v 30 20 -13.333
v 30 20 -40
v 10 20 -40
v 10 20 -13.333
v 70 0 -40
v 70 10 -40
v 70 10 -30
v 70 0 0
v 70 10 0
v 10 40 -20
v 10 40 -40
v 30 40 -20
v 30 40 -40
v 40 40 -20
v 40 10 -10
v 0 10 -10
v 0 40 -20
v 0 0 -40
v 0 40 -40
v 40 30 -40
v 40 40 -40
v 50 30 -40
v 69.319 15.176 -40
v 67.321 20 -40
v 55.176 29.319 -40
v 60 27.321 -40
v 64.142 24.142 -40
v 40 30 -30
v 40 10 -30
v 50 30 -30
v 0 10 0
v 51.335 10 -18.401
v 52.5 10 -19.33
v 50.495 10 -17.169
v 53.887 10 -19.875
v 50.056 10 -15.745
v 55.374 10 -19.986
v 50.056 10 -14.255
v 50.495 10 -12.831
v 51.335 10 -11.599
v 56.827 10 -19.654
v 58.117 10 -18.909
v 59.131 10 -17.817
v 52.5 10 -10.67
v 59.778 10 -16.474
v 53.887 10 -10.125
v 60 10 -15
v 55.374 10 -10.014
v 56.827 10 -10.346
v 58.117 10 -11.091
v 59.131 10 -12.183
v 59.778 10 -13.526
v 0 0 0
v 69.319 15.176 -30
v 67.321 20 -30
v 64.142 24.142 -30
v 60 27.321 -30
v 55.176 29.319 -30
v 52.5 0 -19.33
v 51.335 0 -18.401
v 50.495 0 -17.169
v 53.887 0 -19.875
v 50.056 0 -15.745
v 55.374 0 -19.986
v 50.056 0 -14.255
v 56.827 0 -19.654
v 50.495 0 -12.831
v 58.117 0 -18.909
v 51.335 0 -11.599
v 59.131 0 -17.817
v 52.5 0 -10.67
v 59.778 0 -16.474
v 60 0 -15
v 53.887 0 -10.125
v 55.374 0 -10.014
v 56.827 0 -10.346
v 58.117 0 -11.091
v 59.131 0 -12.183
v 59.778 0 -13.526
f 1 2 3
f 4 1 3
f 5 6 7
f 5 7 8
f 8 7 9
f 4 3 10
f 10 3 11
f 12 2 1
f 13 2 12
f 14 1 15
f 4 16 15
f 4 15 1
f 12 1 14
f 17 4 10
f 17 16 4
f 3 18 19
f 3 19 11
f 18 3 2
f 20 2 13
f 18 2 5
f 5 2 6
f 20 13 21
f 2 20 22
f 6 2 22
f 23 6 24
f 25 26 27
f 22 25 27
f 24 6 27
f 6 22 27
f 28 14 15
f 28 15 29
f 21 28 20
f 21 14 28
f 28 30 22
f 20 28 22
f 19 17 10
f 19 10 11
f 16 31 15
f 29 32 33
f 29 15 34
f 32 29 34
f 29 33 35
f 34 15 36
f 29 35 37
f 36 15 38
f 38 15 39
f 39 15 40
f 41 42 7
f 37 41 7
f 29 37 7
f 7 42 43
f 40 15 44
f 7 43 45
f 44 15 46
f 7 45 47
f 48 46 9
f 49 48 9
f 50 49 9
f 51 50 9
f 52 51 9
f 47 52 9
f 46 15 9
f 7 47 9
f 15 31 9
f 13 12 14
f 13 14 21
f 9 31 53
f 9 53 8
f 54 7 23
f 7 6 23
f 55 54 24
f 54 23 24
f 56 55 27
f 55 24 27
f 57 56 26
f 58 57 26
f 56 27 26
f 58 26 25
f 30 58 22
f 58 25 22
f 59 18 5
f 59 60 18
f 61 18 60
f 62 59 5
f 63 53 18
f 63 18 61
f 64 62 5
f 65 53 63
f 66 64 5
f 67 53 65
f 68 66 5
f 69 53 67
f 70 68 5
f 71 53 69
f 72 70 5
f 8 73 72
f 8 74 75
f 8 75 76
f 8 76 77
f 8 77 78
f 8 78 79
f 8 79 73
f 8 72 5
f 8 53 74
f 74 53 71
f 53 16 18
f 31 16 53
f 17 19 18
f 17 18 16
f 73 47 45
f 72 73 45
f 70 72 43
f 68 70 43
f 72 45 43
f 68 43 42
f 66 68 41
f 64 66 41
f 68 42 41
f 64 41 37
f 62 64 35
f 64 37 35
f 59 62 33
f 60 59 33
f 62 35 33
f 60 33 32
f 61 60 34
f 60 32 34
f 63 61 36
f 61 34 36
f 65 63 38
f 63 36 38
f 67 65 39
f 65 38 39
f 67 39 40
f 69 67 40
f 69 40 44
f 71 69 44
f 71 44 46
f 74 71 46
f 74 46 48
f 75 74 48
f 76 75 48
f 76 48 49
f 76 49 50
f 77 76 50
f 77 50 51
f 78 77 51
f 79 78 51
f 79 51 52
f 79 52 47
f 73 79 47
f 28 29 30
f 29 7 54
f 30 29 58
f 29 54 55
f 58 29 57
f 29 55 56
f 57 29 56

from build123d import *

# Parameters (mm, degrees)
BOSS_EXTRUDE1_DEPTH            = 40
SKETCH2_W                      = 40
SKETCH2_H                      = 30
BOSS_EXTRUDE2_DEPTH            = 20
BOSS_EXTRUDE3_DEPTH            = 30
CUT_EXTRUDE1_DEPTH             = 30
SKETCH5_W                      = 70
SKETCH5_H                      = 40
BOSS_EXTRUDE4_DEPTH            = 10
SKETCH6_W                      = 20
SKETCH6_H                      = 20
CUT_EXTRUDE2_DEPTH             = 41
F_10_0_10_DIAMETER_HOLE1_D     = 10
F_10_0_10_DIAMETER_HOLE1_DEPTH = 40
FILLET1_R                      = 20


with BuildPart() as part:
    # Sketch1 → Boss-Extrude1 (new body)
    with BuildSketch(Plane(origin=(0, 0, 0), x_dir=(0, -1, 0), z_dir=(-1, 0, 0))):
        Polygon((-10, -10), (-40, -20), (-10, -20), align=None)
    extrude(amount=-BOSS_EXTRUDE1_DEPTH)

    # Sketch2 → Boss-Extrude2 (add)
    with BuildSketch(Plane(origin=(0, 0, -20), x_dir=(-1, 0, 0), z_dir=(0, 0, -1))):
        with Locations((-20, 25)):
            Rectangle(SKETCH2_W, SKETCH2_H)
    extrude(amount=BOSS_EXTRUDE2_DEPTH)

    # Sketch3 → Boss-Extrude3 (add)
    with BuildSketch(Plane(origin=(40, 0, 0), x_dir=(0, 0, -1), z_dir=(1, 0, 0))):
        Polygon((40, 10), (0, 10), (20, 40), (40, 40), align=None)
    extrude(amount=BOSS_EXTRUDE3_DEPTH)

    # Sketch4 → Cut-Extrude1 (cut)
    with BuildSketch(Plane(origin=(70, 0, 0), x_dir=(0, 0, -1), z_dir=(1, 0, 0))):
        Polygon((20, 40), (0, 10), (30, 10), (30, 30), (40, 30), (40, 40), align=None)
    extrude(amount=-CUT_EXTRUDE1_DEPTH, mode=Mode.SUBTRACT)

    # Sketch5 → Boss-Extrude4 (add)
    with BuildSketch(Plane.XZ.offset(-10)):
        with Locations((35, -20)):
            Rectangle(SKETCH5_W, SKETCH5_H)
    extrude(amount=BOSS_EXTRUDE4_DEPTH)

    # Sketch6 → Cut-Extrude2 (cut, through all)
    with BuildSketch(Plane(origin=(0, 0, -40), x_dir=(-1, 0, 0), z_dir=(0, 0, -1))):
        with Locations((-20, 30)):
            Rectangle(SKETCH6_W, SKETCH6_H)
    extrude(amount=-CUT_EXTRUDE2_DEPTH, mode=Mode.SUBTRACT)

    # Ø10.0 (10) Diameter Hole1
    with Locations(Plane(origin=(0, 0, 0), x_dir=(-1, 0, 0), z_dir=(0, -1, 0))):
        with Locations((-55, 15)):
            Hole(F_10_0_10_DIAMETER_HOLE1_D / 2, depth=F_10_0_10_DIAMETER_HOLE1_DEPTH)

    # Fillet1
    fillet1_edges = [part.edges().sort_by_distance(p)[0] for p in [
        (70, 30, -35),
    ]]
    fillet(fillet1_edges, radius=FILLET1_R)


solid = part.part
